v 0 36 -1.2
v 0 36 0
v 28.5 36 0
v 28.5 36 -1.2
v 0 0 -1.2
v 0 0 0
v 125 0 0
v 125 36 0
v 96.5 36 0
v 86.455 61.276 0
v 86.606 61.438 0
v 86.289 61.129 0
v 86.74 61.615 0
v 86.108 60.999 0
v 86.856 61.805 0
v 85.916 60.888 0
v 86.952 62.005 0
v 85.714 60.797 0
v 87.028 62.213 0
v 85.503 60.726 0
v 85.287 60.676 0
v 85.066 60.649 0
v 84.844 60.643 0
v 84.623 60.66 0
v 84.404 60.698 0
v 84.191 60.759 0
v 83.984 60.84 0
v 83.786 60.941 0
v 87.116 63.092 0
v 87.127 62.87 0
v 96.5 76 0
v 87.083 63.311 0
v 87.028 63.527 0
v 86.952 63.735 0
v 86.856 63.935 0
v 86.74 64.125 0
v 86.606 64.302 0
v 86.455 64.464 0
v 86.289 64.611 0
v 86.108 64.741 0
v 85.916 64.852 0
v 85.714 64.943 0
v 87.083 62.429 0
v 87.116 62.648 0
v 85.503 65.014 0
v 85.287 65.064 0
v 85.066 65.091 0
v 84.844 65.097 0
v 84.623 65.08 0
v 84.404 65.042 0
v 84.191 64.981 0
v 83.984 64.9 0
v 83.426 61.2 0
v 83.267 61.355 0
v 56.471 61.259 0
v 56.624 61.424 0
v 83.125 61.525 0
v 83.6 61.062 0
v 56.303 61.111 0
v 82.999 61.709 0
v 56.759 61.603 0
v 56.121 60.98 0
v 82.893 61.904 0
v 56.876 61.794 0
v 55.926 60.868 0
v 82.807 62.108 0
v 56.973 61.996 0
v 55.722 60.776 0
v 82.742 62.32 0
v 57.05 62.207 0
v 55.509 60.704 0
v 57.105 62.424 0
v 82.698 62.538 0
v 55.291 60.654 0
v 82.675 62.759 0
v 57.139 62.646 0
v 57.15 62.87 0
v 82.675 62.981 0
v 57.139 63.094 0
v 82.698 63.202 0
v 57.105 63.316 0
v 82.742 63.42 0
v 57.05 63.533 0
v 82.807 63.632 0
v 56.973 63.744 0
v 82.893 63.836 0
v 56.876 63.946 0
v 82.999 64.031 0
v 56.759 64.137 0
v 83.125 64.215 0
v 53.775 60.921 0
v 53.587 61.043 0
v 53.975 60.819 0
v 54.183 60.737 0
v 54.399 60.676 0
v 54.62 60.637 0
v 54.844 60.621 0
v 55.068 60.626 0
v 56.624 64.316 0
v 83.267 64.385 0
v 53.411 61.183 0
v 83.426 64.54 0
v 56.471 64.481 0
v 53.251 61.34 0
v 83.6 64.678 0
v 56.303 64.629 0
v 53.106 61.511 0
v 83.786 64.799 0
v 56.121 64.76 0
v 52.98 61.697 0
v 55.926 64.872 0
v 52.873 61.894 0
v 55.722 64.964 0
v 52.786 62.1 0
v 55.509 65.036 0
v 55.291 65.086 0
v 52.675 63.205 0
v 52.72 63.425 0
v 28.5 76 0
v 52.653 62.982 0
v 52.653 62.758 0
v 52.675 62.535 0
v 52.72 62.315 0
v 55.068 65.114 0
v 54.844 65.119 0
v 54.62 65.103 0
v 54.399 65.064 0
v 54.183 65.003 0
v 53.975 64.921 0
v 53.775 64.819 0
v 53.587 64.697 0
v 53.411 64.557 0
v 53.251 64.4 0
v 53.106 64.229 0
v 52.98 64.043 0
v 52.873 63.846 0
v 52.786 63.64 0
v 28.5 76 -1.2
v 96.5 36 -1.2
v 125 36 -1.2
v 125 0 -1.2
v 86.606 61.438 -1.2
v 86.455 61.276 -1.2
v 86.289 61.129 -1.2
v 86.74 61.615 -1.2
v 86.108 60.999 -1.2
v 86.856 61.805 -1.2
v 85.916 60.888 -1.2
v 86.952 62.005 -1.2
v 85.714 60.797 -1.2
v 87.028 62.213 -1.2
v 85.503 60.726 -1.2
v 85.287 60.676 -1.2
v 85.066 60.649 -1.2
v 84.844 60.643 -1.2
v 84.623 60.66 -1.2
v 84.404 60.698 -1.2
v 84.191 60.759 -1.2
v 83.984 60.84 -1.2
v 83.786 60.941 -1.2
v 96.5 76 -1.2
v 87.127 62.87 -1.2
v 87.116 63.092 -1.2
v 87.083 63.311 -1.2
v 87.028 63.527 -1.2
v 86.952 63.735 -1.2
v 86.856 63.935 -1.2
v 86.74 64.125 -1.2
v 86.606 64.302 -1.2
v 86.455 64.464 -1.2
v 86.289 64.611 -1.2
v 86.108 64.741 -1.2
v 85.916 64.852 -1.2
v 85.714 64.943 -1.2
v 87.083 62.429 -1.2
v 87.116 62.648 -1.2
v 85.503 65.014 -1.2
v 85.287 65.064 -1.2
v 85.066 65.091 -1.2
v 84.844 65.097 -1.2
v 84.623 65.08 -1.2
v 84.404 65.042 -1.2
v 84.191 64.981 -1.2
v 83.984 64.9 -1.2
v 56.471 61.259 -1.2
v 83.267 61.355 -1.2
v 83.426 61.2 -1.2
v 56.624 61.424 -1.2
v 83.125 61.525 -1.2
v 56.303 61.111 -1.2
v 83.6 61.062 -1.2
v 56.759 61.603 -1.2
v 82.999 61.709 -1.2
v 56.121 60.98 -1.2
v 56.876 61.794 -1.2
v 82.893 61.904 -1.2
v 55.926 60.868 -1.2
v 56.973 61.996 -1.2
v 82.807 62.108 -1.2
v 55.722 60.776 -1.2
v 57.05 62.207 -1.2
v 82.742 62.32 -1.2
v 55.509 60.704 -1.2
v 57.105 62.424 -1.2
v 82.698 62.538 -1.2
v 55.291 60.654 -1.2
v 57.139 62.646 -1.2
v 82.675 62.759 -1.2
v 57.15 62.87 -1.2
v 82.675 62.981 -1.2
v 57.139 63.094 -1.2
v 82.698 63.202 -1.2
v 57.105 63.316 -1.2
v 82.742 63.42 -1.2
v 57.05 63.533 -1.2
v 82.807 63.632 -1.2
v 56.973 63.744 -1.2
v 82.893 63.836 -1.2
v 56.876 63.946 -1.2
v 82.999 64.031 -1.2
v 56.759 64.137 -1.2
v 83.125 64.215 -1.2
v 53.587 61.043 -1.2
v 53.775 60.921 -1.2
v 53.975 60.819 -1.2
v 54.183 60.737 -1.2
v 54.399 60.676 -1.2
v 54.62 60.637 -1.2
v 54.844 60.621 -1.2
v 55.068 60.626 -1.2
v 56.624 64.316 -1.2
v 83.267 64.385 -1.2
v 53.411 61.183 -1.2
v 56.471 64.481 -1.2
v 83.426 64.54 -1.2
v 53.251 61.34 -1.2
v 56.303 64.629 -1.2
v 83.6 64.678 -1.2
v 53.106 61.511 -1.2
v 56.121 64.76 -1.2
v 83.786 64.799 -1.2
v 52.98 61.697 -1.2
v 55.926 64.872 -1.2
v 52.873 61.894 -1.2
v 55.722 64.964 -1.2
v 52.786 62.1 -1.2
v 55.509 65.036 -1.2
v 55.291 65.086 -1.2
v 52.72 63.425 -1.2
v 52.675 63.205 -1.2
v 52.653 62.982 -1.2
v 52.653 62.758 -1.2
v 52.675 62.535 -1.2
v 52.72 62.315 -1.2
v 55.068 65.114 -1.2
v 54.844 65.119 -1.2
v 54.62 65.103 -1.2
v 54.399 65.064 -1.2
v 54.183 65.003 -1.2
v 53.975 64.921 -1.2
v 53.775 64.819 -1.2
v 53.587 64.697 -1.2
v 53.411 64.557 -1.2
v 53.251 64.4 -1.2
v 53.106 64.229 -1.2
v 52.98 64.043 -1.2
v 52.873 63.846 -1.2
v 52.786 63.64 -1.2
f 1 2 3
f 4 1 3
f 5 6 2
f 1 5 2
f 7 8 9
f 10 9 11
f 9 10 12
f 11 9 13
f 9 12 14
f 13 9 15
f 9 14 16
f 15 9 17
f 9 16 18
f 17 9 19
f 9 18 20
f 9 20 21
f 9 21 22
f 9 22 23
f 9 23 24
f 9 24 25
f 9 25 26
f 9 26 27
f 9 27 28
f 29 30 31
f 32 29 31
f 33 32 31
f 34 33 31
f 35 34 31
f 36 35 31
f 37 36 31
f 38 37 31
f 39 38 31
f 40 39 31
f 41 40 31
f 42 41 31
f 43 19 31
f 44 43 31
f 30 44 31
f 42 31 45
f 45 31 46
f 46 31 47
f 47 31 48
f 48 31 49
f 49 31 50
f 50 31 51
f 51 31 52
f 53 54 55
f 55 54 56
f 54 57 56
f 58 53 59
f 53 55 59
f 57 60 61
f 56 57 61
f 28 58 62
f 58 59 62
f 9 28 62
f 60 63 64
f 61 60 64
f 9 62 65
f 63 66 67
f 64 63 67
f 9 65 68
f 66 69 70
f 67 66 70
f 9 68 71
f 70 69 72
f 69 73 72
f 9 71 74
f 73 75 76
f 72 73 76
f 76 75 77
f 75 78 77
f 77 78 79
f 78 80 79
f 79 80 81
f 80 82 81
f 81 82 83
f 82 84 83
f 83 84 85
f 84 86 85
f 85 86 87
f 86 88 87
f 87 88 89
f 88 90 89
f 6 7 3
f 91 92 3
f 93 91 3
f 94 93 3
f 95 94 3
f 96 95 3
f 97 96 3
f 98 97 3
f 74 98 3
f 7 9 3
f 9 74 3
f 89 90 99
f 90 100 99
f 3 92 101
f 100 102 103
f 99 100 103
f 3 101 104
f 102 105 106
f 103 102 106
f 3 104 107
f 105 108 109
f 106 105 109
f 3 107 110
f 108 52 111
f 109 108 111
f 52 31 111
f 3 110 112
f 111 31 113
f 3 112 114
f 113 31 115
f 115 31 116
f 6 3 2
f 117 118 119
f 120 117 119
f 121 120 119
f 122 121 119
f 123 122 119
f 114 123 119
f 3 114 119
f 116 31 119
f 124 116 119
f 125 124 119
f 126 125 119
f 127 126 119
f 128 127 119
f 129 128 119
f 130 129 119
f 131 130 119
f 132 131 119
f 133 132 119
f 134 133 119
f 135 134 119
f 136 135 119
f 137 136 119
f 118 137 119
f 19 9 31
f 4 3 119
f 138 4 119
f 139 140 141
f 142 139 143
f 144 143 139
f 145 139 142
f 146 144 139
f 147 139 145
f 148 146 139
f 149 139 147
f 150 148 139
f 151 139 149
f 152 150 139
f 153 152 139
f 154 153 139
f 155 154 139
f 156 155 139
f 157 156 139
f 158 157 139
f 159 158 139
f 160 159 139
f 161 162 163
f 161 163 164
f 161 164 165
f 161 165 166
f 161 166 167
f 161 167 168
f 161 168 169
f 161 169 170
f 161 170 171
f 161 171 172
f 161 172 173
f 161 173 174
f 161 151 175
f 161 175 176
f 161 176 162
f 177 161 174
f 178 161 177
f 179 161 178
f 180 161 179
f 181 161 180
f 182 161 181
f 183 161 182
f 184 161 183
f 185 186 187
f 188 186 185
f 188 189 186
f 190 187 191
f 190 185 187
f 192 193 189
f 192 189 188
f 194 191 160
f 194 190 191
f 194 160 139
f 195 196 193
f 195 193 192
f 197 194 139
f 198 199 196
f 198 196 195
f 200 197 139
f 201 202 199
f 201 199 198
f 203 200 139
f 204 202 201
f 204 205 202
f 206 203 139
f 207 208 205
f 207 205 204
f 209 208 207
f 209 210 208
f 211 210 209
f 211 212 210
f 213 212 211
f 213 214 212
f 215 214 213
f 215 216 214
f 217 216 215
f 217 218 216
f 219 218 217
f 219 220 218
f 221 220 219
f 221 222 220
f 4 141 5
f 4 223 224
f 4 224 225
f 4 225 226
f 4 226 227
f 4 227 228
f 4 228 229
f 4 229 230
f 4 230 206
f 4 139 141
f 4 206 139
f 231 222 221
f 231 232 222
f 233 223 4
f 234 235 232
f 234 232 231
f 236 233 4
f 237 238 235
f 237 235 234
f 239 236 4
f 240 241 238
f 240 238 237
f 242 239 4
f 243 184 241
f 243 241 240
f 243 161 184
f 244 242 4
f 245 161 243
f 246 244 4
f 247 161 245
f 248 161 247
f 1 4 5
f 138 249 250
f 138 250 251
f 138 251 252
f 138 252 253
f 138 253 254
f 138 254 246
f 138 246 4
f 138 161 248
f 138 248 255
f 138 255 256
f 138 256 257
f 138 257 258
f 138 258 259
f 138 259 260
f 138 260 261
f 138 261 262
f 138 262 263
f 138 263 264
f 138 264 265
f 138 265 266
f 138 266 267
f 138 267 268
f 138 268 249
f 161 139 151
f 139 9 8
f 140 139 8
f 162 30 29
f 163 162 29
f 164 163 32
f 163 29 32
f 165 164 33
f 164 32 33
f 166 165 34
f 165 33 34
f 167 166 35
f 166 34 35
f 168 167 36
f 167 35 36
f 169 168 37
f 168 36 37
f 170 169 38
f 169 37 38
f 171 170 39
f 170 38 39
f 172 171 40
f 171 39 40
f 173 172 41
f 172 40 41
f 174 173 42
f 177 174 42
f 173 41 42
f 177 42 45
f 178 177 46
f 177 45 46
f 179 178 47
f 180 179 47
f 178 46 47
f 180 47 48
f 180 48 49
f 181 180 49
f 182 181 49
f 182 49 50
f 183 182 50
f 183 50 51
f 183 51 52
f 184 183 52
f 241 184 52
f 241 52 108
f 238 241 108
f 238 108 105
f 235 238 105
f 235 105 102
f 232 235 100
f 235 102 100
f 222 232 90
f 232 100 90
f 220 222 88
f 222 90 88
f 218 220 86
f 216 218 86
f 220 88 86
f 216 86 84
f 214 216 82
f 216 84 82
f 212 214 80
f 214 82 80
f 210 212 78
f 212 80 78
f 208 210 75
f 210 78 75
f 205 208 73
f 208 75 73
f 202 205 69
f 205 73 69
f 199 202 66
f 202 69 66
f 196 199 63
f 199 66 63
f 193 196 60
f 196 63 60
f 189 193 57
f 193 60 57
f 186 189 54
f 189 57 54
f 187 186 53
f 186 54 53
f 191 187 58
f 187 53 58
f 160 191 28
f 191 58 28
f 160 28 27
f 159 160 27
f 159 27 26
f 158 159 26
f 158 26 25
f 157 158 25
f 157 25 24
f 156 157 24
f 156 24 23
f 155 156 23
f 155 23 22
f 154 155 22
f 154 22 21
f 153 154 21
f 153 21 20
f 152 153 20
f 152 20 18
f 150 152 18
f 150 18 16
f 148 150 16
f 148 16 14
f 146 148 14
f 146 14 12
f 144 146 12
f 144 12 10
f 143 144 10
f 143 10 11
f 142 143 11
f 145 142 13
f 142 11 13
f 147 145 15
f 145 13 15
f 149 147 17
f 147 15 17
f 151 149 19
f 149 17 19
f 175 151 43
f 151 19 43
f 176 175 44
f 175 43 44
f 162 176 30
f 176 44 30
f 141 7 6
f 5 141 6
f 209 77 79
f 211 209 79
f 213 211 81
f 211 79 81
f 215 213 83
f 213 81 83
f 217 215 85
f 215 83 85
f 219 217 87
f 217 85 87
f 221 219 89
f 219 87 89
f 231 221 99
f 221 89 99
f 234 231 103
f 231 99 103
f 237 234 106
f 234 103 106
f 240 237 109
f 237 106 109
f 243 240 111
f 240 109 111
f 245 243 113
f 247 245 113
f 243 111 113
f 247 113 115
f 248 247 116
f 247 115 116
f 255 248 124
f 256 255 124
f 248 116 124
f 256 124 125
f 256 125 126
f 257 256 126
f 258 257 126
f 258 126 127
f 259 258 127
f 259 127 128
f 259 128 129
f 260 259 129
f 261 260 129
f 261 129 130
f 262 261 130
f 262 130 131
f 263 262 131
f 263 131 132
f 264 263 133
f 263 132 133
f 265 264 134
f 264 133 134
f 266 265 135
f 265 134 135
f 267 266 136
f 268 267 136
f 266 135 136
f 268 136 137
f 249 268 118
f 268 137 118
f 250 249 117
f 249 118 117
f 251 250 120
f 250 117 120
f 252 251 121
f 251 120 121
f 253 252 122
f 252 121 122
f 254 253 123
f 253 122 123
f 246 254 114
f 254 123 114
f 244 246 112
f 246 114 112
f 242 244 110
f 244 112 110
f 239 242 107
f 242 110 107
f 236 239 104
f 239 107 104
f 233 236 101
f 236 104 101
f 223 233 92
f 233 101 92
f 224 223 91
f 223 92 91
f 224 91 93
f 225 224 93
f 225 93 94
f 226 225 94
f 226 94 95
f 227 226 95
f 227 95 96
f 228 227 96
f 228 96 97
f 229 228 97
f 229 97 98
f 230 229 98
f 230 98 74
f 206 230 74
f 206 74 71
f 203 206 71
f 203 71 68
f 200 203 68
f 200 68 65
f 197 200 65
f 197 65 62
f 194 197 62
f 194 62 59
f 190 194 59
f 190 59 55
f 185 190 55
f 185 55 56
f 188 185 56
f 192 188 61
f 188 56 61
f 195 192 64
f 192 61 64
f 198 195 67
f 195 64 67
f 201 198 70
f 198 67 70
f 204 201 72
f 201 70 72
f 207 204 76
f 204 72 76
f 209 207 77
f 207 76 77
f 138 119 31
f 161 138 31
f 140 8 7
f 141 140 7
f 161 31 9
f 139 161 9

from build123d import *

# Parameters (mm, degrees)
SKETCH_1_R             = 2.25
SKETCH_1_R_2           = 2.227348473
SM_BASE_FLANGE_1_DEPTH = 1.2


# Sheet-metal steps are written as plain solids
with BuildPart() as part:
    # Sketch 1 → Базовая кромка1 (new body)
    with BuildSketch(Plane.XY):
        Polygon((28.5, 36), (28.5, 76), (96.5, 76), (96.5, 36), (125, 36), (125, 0), (0, 0), (0, 36), align=None)
        with Locations((54.9, 62.87)):
            Circle(SKETCH_1_R, mode=Mode.SUBTRACT)
        with Locations((84.9, 62.87)):
            Circle(SKETCH_1_R_2, mode=Mode.SUBTRACT)
    extrude(amount=-SM_BASE_FLANGE_1_DEPTH)


solid = part.part
